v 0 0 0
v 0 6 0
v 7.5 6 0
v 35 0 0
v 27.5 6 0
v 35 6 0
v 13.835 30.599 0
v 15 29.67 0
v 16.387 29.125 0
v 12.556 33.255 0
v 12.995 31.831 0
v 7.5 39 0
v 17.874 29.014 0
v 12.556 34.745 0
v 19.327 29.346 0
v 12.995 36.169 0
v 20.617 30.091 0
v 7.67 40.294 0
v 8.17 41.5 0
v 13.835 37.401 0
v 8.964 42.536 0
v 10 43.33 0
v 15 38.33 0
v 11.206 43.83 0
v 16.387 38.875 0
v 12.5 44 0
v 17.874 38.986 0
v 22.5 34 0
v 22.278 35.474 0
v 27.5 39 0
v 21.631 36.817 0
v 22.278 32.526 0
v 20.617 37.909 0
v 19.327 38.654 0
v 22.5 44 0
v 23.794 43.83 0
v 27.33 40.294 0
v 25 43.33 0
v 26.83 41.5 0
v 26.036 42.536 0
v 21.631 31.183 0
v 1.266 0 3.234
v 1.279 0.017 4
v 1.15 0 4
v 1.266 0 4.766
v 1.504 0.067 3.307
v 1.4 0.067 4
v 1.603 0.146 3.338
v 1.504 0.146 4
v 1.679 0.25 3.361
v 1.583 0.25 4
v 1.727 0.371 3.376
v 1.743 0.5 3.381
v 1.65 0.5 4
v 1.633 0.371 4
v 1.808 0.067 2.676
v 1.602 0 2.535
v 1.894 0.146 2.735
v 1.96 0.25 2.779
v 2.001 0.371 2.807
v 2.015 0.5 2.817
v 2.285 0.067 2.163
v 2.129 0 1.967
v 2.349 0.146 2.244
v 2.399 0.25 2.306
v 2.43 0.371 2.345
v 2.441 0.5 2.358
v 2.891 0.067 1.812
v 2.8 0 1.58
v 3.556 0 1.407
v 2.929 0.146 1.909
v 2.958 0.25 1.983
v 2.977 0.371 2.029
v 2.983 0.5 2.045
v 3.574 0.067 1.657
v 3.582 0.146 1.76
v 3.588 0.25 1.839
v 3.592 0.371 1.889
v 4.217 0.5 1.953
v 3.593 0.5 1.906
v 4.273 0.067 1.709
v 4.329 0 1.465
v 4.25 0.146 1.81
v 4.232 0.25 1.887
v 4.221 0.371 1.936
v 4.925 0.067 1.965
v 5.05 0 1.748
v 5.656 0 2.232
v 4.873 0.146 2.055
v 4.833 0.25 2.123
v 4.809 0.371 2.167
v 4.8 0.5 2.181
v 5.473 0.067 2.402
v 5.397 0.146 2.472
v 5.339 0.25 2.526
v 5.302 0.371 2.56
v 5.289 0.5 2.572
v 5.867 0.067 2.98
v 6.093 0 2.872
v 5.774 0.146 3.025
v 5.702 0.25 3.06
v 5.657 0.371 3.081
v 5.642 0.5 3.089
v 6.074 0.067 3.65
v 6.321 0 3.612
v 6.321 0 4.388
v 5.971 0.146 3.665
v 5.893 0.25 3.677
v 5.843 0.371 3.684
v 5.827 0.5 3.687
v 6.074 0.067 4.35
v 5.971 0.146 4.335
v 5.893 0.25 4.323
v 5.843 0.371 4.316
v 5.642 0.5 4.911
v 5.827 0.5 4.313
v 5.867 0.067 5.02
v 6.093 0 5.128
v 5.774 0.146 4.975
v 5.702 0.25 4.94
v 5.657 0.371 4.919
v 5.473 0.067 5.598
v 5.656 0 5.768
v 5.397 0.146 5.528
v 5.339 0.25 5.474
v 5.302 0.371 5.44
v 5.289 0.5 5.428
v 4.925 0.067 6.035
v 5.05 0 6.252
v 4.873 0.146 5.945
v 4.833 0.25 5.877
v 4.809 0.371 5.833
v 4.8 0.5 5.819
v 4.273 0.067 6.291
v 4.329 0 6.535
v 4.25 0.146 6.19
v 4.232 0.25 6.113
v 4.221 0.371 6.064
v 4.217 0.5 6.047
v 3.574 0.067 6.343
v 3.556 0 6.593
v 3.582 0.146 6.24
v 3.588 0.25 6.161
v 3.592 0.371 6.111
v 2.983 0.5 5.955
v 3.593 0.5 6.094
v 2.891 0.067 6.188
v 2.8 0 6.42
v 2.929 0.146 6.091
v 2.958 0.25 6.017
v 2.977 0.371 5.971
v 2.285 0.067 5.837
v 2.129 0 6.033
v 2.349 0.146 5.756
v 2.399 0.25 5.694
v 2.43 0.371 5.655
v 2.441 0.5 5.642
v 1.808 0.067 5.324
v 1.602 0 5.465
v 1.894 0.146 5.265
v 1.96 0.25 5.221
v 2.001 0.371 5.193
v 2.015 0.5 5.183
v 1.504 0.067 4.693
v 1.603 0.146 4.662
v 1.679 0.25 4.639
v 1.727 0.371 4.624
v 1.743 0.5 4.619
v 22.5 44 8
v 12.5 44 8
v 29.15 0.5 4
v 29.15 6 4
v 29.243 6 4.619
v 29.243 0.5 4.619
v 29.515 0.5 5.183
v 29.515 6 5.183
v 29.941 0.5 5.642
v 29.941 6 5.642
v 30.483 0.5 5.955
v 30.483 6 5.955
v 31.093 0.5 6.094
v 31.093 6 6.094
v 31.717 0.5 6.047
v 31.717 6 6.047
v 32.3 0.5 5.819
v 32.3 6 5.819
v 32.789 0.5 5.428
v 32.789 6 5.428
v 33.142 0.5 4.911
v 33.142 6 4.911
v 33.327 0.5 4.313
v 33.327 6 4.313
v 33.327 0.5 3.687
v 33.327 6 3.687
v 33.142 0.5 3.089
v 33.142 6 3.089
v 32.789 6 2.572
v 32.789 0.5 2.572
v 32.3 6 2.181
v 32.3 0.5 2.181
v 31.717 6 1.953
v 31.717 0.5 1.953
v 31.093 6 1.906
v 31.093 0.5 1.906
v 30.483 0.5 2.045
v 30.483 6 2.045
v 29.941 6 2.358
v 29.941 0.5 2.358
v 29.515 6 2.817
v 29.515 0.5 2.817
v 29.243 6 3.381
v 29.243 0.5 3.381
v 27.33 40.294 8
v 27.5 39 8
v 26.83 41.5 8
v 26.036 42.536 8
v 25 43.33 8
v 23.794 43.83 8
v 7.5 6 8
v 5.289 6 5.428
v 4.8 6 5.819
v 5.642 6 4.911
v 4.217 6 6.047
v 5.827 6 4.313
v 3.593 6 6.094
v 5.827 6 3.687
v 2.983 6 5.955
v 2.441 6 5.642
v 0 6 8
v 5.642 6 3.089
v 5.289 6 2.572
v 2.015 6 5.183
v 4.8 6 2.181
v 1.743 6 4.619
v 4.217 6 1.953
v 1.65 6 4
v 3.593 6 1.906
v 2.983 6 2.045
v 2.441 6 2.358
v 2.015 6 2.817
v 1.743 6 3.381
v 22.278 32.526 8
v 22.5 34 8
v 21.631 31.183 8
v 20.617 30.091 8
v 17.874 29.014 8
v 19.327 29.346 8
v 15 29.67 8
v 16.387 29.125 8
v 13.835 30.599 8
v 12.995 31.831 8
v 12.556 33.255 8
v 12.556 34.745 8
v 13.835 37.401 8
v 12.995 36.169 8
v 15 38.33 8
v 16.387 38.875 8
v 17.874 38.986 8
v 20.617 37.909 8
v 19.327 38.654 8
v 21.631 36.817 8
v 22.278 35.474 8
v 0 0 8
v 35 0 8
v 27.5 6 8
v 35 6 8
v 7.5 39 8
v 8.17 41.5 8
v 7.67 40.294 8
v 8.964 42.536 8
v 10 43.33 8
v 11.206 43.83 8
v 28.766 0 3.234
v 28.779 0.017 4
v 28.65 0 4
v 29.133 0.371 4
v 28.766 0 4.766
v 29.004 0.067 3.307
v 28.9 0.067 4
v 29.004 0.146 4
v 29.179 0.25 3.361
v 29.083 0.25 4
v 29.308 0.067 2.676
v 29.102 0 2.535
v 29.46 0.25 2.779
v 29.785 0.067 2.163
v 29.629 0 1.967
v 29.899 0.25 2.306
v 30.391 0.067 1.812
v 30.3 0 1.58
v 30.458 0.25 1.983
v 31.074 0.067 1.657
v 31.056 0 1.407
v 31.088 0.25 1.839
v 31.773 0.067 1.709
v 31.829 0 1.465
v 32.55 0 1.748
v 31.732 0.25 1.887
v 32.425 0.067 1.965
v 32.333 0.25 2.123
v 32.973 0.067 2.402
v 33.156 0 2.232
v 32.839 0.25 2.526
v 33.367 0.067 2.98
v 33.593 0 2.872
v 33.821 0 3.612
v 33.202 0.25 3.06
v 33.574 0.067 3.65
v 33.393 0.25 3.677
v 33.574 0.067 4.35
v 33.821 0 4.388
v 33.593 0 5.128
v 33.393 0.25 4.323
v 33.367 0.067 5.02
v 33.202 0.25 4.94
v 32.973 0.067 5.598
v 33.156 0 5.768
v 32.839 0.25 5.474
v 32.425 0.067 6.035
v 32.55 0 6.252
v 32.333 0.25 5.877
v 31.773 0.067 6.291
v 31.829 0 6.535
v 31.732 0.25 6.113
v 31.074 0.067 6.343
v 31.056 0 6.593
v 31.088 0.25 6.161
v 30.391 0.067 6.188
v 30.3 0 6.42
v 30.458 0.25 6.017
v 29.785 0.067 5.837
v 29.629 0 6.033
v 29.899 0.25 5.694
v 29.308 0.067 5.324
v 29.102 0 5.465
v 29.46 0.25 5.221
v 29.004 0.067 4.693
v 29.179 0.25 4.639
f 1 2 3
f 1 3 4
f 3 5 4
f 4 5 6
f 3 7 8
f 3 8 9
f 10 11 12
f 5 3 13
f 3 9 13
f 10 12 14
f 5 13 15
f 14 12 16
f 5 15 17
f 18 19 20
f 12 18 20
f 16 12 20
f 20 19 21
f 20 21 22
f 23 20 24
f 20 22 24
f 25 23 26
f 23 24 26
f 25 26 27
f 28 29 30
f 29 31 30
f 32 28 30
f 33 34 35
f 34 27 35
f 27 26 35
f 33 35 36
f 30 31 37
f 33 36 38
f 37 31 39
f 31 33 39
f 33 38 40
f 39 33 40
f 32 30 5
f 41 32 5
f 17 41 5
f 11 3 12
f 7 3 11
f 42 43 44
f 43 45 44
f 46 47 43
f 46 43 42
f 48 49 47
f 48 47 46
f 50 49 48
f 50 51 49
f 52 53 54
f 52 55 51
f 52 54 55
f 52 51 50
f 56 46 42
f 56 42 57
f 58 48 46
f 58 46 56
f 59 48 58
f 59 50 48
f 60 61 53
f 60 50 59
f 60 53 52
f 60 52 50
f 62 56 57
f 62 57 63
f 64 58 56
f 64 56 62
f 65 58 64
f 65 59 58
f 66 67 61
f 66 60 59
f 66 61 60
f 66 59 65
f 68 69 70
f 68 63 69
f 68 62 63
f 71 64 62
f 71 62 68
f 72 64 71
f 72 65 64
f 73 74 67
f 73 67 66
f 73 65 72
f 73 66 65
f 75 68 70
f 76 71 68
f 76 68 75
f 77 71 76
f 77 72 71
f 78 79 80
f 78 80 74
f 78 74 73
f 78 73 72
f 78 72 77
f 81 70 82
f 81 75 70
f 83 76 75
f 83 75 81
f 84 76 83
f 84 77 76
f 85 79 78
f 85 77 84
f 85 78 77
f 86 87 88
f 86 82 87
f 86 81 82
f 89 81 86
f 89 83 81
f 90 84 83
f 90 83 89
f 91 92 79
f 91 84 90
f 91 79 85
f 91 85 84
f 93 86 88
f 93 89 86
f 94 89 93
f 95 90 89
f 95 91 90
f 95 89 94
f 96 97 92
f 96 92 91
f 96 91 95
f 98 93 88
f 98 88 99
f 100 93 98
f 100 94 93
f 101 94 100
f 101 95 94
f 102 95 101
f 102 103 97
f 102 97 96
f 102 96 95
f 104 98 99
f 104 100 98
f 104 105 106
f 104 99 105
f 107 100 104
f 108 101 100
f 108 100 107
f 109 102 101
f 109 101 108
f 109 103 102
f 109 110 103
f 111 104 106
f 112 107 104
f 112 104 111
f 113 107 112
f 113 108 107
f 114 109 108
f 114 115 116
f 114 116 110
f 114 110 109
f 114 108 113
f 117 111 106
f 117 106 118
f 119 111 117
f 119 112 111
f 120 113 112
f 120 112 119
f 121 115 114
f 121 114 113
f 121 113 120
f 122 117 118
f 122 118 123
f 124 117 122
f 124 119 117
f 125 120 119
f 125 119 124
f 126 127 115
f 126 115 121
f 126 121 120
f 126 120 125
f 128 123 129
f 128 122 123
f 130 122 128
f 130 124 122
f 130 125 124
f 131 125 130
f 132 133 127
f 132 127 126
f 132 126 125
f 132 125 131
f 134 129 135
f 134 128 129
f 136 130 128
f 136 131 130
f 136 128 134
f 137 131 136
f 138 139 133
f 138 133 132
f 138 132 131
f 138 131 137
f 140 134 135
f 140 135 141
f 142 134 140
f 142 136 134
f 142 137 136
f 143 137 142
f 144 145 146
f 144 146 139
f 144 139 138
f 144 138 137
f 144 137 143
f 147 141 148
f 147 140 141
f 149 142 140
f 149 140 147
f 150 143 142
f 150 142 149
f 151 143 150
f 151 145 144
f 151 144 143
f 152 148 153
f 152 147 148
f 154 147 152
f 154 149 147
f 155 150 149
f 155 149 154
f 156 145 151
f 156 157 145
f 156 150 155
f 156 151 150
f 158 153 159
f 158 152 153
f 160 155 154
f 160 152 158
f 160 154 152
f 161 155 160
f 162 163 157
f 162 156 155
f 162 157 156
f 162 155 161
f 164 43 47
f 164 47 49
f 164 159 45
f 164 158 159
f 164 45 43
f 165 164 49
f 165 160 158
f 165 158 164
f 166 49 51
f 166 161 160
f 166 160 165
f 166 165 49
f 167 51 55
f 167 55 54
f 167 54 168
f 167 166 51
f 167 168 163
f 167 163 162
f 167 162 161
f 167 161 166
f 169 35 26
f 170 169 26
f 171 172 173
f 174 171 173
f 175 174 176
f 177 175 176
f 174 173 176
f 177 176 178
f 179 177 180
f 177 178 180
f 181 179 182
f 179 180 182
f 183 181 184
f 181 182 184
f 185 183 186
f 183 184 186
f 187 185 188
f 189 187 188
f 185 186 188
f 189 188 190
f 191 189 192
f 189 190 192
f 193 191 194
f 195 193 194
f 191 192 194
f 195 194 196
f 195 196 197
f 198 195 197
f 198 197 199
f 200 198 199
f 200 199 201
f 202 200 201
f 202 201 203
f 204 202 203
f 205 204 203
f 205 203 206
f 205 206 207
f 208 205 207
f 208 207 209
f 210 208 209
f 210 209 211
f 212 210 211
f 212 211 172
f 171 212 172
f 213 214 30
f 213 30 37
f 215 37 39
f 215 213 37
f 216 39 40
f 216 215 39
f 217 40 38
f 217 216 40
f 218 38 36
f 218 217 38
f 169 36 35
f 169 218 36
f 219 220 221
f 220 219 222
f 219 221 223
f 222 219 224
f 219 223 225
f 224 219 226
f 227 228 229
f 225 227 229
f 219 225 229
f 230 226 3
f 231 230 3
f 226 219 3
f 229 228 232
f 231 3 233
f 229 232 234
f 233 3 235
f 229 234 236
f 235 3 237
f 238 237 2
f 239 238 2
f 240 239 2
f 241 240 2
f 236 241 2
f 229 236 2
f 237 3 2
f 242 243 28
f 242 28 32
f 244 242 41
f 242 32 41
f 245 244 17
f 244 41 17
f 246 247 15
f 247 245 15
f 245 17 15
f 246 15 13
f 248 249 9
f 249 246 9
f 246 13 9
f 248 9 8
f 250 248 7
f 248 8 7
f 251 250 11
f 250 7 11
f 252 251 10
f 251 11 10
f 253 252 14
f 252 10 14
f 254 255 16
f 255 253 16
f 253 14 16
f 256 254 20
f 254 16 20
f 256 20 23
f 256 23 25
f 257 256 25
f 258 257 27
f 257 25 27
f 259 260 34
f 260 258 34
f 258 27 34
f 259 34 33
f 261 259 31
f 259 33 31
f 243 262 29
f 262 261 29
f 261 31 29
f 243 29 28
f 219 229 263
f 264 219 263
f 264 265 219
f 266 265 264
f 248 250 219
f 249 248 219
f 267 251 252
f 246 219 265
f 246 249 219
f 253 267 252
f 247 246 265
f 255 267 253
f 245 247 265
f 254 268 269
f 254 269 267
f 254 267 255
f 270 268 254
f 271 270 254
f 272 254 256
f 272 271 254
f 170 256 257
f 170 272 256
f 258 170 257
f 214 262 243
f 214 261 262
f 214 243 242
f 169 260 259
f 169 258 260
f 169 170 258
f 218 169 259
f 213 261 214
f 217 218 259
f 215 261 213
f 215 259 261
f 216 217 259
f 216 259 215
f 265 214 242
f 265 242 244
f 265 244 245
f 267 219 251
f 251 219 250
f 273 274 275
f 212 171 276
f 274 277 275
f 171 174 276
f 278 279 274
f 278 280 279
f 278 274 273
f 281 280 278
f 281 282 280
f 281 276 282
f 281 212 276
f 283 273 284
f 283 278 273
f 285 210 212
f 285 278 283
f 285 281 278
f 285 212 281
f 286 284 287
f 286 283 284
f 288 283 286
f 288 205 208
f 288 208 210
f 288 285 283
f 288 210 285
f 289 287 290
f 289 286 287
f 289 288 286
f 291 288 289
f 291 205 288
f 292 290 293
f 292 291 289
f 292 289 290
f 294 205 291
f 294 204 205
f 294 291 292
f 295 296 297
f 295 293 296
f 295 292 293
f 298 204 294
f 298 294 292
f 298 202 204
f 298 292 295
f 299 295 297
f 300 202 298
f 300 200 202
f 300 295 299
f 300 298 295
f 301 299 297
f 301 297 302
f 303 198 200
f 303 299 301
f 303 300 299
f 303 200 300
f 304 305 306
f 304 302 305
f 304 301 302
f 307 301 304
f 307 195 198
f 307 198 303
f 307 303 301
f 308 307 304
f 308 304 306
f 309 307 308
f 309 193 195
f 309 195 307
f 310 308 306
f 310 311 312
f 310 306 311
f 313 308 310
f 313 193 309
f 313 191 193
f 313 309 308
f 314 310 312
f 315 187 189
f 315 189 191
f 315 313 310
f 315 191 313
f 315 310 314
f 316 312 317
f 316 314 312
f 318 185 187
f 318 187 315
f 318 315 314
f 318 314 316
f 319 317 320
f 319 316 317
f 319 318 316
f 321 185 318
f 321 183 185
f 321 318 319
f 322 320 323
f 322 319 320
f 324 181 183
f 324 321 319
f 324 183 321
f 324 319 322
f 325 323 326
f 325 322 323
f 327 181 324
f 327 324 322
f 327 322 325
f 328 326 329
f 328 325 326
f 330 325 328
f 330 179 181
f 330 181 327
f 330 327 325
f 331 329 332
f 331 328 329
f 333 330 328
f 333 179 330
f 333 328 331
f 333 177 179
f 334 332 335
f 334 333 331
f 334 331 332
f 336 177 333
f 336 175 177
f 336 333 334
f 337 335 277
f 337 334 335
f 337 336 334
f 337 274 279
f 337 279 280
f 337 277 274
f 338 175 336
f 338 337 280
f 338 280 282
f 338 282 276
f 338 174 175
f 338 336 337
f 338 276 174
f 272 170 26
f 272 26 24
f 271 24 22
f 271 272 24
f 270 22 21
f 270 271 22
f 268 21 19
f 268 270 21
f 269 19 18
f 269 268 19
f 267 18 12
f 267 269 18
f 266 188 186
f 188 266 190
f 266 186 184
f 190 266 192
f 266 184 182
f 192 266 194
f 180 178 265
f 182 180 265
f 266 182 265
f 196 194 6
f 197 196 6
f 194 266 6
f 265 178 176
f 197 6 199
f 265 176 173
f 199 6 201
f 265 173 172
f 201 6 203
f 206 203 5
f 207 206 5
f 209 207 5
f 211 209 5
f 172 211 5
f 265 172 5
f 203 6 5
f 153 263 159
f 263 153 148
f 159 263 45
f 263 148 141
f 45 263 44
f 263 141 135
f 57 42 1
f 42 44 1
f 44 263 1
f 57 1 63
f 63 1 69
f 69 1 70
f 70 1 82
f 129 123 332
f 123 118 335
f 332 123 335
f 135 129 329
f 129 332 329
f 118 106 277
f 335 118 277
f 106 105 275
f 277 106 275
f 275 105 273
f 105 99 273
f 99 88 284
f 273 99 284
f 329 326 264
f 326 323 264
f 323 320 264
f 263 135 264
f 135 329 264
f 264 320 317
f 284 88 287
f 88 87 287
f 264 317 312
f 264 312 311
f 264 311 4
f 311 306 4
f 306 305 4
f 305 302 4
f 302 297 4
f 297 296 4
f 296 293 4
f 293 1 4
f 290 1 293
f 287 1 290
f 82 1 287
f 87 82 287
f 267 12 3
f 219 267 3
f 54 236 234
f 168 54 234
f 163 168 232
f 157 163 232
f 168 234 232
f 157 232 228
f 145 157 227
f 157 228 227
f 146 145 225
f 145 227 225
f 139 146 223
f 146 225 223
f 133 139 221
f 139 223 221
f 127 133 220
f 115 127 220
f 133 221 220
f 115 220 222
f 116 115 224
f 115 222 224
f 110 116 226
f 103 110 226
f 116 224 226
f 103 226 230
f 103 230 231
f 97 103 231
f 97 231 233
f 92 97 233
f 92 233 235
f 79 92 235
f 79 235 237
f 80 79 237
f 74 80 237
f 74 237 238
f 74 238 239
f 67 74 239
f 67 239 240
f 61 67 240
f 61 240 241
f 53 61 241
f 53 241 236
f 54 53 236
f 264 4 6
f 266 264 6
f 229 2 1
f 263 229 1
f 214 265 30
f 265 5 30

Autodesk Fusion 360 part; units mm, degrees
sketch "Esquisse1" plane through (0, 0, 0) normal (0, 0, 1) x (1, 0, 0)
  line L0 (0, 0) -> (35, 0)
  line L1 (35, 0) -> (35, 6)
  line L2 (35, 6) -> (0, 6)
  line L3 (0, 6) -> (0, 0)
  line L4 (7.5, 6) -> (27.5, 6)
  line L5 (27.5, 6) -> (27.5, 44)
  line L6 (27.5, 44) -> (7.5, 44)
  line L7 (7.5, 44) -> (7.5, 6)
  circle A0 centre (17.5, 34) radius 5
  line L8 (7.5, 44) -> (27.5, 44) construction
  line L9 (27.5, 44) -> (27.5, 24) construction
  line L10 (27.5, 24) -> (7.5, 24) construction
  line L11 (7.5, 24) -> (7.5, 44) construction
  line L12 (7.5, 44) -> (27.5, 24) construction
  line L13 (27.5, 44) -> (7.5, 24) construction
  dimension "d1" = 35
  dimension "d2" = 6
  dimension "d3" = 20
  dimension "d5" = 10
  dimension "d6" = 20
  dimension "d7" = 20
  dimension "d10" = 34
extrude "Extrusion1" add sketch "Esquisse1" along normal blind 8
sketch "Esquisse2" plane through (0, 6, 0) normal (0, 1, 0) x (-1, 0, 0)
  line L0 (-7.5, 0) -> (0, 0)
  line L1 (0, 0) -> (0, 8)
  line L2 (0, 8) -> (-7.5, 8)
  line L3 (-7.5, 8) -> (-7.5, 0)
  circle A0 centre (-3.75, 4) radius 2.1
  line L4 (0, 0) -> (-7.5, 8) construction
  line L5 (-7.5, 0) -> (0, 8) construction
  dimension "d11" = 4.2
sketch "Esquisse3" plane through (0, 6, 0) normal (0, 1, 0) x (-1, 0, 0)
  line L0 (-35, 0) -> (-27.5, 0)
  line L1 (-27.5, 0) -> (-27.5, 8)
  line L2 (-27.5, 8) -> (-35, 8)
  line L3 (-35, 8) -> (-35, 0)
  line L4 (-27.5, 0) -> (-35, 8) construction
  line L5 (-35, 0) -> (-27.5, 8) construction
  circle A0 centre (-31.25, 4) radius 2.1
  dimension "d12" = 4.2
extrude "Extrusion2" cut sketch "Esquisse2" sketch "Esquisse3" against normal blind 10 contours A0 of sketch 2 contours A0
fillet "Congé1" radius 0.5 2 edges at (5.7079, 0, 3.2406) (33.2079, 0, 3.2406)
fillet "Congé2" radius 5 2 edges at (7.5, 44, 4) (27.5, 44, 4)
